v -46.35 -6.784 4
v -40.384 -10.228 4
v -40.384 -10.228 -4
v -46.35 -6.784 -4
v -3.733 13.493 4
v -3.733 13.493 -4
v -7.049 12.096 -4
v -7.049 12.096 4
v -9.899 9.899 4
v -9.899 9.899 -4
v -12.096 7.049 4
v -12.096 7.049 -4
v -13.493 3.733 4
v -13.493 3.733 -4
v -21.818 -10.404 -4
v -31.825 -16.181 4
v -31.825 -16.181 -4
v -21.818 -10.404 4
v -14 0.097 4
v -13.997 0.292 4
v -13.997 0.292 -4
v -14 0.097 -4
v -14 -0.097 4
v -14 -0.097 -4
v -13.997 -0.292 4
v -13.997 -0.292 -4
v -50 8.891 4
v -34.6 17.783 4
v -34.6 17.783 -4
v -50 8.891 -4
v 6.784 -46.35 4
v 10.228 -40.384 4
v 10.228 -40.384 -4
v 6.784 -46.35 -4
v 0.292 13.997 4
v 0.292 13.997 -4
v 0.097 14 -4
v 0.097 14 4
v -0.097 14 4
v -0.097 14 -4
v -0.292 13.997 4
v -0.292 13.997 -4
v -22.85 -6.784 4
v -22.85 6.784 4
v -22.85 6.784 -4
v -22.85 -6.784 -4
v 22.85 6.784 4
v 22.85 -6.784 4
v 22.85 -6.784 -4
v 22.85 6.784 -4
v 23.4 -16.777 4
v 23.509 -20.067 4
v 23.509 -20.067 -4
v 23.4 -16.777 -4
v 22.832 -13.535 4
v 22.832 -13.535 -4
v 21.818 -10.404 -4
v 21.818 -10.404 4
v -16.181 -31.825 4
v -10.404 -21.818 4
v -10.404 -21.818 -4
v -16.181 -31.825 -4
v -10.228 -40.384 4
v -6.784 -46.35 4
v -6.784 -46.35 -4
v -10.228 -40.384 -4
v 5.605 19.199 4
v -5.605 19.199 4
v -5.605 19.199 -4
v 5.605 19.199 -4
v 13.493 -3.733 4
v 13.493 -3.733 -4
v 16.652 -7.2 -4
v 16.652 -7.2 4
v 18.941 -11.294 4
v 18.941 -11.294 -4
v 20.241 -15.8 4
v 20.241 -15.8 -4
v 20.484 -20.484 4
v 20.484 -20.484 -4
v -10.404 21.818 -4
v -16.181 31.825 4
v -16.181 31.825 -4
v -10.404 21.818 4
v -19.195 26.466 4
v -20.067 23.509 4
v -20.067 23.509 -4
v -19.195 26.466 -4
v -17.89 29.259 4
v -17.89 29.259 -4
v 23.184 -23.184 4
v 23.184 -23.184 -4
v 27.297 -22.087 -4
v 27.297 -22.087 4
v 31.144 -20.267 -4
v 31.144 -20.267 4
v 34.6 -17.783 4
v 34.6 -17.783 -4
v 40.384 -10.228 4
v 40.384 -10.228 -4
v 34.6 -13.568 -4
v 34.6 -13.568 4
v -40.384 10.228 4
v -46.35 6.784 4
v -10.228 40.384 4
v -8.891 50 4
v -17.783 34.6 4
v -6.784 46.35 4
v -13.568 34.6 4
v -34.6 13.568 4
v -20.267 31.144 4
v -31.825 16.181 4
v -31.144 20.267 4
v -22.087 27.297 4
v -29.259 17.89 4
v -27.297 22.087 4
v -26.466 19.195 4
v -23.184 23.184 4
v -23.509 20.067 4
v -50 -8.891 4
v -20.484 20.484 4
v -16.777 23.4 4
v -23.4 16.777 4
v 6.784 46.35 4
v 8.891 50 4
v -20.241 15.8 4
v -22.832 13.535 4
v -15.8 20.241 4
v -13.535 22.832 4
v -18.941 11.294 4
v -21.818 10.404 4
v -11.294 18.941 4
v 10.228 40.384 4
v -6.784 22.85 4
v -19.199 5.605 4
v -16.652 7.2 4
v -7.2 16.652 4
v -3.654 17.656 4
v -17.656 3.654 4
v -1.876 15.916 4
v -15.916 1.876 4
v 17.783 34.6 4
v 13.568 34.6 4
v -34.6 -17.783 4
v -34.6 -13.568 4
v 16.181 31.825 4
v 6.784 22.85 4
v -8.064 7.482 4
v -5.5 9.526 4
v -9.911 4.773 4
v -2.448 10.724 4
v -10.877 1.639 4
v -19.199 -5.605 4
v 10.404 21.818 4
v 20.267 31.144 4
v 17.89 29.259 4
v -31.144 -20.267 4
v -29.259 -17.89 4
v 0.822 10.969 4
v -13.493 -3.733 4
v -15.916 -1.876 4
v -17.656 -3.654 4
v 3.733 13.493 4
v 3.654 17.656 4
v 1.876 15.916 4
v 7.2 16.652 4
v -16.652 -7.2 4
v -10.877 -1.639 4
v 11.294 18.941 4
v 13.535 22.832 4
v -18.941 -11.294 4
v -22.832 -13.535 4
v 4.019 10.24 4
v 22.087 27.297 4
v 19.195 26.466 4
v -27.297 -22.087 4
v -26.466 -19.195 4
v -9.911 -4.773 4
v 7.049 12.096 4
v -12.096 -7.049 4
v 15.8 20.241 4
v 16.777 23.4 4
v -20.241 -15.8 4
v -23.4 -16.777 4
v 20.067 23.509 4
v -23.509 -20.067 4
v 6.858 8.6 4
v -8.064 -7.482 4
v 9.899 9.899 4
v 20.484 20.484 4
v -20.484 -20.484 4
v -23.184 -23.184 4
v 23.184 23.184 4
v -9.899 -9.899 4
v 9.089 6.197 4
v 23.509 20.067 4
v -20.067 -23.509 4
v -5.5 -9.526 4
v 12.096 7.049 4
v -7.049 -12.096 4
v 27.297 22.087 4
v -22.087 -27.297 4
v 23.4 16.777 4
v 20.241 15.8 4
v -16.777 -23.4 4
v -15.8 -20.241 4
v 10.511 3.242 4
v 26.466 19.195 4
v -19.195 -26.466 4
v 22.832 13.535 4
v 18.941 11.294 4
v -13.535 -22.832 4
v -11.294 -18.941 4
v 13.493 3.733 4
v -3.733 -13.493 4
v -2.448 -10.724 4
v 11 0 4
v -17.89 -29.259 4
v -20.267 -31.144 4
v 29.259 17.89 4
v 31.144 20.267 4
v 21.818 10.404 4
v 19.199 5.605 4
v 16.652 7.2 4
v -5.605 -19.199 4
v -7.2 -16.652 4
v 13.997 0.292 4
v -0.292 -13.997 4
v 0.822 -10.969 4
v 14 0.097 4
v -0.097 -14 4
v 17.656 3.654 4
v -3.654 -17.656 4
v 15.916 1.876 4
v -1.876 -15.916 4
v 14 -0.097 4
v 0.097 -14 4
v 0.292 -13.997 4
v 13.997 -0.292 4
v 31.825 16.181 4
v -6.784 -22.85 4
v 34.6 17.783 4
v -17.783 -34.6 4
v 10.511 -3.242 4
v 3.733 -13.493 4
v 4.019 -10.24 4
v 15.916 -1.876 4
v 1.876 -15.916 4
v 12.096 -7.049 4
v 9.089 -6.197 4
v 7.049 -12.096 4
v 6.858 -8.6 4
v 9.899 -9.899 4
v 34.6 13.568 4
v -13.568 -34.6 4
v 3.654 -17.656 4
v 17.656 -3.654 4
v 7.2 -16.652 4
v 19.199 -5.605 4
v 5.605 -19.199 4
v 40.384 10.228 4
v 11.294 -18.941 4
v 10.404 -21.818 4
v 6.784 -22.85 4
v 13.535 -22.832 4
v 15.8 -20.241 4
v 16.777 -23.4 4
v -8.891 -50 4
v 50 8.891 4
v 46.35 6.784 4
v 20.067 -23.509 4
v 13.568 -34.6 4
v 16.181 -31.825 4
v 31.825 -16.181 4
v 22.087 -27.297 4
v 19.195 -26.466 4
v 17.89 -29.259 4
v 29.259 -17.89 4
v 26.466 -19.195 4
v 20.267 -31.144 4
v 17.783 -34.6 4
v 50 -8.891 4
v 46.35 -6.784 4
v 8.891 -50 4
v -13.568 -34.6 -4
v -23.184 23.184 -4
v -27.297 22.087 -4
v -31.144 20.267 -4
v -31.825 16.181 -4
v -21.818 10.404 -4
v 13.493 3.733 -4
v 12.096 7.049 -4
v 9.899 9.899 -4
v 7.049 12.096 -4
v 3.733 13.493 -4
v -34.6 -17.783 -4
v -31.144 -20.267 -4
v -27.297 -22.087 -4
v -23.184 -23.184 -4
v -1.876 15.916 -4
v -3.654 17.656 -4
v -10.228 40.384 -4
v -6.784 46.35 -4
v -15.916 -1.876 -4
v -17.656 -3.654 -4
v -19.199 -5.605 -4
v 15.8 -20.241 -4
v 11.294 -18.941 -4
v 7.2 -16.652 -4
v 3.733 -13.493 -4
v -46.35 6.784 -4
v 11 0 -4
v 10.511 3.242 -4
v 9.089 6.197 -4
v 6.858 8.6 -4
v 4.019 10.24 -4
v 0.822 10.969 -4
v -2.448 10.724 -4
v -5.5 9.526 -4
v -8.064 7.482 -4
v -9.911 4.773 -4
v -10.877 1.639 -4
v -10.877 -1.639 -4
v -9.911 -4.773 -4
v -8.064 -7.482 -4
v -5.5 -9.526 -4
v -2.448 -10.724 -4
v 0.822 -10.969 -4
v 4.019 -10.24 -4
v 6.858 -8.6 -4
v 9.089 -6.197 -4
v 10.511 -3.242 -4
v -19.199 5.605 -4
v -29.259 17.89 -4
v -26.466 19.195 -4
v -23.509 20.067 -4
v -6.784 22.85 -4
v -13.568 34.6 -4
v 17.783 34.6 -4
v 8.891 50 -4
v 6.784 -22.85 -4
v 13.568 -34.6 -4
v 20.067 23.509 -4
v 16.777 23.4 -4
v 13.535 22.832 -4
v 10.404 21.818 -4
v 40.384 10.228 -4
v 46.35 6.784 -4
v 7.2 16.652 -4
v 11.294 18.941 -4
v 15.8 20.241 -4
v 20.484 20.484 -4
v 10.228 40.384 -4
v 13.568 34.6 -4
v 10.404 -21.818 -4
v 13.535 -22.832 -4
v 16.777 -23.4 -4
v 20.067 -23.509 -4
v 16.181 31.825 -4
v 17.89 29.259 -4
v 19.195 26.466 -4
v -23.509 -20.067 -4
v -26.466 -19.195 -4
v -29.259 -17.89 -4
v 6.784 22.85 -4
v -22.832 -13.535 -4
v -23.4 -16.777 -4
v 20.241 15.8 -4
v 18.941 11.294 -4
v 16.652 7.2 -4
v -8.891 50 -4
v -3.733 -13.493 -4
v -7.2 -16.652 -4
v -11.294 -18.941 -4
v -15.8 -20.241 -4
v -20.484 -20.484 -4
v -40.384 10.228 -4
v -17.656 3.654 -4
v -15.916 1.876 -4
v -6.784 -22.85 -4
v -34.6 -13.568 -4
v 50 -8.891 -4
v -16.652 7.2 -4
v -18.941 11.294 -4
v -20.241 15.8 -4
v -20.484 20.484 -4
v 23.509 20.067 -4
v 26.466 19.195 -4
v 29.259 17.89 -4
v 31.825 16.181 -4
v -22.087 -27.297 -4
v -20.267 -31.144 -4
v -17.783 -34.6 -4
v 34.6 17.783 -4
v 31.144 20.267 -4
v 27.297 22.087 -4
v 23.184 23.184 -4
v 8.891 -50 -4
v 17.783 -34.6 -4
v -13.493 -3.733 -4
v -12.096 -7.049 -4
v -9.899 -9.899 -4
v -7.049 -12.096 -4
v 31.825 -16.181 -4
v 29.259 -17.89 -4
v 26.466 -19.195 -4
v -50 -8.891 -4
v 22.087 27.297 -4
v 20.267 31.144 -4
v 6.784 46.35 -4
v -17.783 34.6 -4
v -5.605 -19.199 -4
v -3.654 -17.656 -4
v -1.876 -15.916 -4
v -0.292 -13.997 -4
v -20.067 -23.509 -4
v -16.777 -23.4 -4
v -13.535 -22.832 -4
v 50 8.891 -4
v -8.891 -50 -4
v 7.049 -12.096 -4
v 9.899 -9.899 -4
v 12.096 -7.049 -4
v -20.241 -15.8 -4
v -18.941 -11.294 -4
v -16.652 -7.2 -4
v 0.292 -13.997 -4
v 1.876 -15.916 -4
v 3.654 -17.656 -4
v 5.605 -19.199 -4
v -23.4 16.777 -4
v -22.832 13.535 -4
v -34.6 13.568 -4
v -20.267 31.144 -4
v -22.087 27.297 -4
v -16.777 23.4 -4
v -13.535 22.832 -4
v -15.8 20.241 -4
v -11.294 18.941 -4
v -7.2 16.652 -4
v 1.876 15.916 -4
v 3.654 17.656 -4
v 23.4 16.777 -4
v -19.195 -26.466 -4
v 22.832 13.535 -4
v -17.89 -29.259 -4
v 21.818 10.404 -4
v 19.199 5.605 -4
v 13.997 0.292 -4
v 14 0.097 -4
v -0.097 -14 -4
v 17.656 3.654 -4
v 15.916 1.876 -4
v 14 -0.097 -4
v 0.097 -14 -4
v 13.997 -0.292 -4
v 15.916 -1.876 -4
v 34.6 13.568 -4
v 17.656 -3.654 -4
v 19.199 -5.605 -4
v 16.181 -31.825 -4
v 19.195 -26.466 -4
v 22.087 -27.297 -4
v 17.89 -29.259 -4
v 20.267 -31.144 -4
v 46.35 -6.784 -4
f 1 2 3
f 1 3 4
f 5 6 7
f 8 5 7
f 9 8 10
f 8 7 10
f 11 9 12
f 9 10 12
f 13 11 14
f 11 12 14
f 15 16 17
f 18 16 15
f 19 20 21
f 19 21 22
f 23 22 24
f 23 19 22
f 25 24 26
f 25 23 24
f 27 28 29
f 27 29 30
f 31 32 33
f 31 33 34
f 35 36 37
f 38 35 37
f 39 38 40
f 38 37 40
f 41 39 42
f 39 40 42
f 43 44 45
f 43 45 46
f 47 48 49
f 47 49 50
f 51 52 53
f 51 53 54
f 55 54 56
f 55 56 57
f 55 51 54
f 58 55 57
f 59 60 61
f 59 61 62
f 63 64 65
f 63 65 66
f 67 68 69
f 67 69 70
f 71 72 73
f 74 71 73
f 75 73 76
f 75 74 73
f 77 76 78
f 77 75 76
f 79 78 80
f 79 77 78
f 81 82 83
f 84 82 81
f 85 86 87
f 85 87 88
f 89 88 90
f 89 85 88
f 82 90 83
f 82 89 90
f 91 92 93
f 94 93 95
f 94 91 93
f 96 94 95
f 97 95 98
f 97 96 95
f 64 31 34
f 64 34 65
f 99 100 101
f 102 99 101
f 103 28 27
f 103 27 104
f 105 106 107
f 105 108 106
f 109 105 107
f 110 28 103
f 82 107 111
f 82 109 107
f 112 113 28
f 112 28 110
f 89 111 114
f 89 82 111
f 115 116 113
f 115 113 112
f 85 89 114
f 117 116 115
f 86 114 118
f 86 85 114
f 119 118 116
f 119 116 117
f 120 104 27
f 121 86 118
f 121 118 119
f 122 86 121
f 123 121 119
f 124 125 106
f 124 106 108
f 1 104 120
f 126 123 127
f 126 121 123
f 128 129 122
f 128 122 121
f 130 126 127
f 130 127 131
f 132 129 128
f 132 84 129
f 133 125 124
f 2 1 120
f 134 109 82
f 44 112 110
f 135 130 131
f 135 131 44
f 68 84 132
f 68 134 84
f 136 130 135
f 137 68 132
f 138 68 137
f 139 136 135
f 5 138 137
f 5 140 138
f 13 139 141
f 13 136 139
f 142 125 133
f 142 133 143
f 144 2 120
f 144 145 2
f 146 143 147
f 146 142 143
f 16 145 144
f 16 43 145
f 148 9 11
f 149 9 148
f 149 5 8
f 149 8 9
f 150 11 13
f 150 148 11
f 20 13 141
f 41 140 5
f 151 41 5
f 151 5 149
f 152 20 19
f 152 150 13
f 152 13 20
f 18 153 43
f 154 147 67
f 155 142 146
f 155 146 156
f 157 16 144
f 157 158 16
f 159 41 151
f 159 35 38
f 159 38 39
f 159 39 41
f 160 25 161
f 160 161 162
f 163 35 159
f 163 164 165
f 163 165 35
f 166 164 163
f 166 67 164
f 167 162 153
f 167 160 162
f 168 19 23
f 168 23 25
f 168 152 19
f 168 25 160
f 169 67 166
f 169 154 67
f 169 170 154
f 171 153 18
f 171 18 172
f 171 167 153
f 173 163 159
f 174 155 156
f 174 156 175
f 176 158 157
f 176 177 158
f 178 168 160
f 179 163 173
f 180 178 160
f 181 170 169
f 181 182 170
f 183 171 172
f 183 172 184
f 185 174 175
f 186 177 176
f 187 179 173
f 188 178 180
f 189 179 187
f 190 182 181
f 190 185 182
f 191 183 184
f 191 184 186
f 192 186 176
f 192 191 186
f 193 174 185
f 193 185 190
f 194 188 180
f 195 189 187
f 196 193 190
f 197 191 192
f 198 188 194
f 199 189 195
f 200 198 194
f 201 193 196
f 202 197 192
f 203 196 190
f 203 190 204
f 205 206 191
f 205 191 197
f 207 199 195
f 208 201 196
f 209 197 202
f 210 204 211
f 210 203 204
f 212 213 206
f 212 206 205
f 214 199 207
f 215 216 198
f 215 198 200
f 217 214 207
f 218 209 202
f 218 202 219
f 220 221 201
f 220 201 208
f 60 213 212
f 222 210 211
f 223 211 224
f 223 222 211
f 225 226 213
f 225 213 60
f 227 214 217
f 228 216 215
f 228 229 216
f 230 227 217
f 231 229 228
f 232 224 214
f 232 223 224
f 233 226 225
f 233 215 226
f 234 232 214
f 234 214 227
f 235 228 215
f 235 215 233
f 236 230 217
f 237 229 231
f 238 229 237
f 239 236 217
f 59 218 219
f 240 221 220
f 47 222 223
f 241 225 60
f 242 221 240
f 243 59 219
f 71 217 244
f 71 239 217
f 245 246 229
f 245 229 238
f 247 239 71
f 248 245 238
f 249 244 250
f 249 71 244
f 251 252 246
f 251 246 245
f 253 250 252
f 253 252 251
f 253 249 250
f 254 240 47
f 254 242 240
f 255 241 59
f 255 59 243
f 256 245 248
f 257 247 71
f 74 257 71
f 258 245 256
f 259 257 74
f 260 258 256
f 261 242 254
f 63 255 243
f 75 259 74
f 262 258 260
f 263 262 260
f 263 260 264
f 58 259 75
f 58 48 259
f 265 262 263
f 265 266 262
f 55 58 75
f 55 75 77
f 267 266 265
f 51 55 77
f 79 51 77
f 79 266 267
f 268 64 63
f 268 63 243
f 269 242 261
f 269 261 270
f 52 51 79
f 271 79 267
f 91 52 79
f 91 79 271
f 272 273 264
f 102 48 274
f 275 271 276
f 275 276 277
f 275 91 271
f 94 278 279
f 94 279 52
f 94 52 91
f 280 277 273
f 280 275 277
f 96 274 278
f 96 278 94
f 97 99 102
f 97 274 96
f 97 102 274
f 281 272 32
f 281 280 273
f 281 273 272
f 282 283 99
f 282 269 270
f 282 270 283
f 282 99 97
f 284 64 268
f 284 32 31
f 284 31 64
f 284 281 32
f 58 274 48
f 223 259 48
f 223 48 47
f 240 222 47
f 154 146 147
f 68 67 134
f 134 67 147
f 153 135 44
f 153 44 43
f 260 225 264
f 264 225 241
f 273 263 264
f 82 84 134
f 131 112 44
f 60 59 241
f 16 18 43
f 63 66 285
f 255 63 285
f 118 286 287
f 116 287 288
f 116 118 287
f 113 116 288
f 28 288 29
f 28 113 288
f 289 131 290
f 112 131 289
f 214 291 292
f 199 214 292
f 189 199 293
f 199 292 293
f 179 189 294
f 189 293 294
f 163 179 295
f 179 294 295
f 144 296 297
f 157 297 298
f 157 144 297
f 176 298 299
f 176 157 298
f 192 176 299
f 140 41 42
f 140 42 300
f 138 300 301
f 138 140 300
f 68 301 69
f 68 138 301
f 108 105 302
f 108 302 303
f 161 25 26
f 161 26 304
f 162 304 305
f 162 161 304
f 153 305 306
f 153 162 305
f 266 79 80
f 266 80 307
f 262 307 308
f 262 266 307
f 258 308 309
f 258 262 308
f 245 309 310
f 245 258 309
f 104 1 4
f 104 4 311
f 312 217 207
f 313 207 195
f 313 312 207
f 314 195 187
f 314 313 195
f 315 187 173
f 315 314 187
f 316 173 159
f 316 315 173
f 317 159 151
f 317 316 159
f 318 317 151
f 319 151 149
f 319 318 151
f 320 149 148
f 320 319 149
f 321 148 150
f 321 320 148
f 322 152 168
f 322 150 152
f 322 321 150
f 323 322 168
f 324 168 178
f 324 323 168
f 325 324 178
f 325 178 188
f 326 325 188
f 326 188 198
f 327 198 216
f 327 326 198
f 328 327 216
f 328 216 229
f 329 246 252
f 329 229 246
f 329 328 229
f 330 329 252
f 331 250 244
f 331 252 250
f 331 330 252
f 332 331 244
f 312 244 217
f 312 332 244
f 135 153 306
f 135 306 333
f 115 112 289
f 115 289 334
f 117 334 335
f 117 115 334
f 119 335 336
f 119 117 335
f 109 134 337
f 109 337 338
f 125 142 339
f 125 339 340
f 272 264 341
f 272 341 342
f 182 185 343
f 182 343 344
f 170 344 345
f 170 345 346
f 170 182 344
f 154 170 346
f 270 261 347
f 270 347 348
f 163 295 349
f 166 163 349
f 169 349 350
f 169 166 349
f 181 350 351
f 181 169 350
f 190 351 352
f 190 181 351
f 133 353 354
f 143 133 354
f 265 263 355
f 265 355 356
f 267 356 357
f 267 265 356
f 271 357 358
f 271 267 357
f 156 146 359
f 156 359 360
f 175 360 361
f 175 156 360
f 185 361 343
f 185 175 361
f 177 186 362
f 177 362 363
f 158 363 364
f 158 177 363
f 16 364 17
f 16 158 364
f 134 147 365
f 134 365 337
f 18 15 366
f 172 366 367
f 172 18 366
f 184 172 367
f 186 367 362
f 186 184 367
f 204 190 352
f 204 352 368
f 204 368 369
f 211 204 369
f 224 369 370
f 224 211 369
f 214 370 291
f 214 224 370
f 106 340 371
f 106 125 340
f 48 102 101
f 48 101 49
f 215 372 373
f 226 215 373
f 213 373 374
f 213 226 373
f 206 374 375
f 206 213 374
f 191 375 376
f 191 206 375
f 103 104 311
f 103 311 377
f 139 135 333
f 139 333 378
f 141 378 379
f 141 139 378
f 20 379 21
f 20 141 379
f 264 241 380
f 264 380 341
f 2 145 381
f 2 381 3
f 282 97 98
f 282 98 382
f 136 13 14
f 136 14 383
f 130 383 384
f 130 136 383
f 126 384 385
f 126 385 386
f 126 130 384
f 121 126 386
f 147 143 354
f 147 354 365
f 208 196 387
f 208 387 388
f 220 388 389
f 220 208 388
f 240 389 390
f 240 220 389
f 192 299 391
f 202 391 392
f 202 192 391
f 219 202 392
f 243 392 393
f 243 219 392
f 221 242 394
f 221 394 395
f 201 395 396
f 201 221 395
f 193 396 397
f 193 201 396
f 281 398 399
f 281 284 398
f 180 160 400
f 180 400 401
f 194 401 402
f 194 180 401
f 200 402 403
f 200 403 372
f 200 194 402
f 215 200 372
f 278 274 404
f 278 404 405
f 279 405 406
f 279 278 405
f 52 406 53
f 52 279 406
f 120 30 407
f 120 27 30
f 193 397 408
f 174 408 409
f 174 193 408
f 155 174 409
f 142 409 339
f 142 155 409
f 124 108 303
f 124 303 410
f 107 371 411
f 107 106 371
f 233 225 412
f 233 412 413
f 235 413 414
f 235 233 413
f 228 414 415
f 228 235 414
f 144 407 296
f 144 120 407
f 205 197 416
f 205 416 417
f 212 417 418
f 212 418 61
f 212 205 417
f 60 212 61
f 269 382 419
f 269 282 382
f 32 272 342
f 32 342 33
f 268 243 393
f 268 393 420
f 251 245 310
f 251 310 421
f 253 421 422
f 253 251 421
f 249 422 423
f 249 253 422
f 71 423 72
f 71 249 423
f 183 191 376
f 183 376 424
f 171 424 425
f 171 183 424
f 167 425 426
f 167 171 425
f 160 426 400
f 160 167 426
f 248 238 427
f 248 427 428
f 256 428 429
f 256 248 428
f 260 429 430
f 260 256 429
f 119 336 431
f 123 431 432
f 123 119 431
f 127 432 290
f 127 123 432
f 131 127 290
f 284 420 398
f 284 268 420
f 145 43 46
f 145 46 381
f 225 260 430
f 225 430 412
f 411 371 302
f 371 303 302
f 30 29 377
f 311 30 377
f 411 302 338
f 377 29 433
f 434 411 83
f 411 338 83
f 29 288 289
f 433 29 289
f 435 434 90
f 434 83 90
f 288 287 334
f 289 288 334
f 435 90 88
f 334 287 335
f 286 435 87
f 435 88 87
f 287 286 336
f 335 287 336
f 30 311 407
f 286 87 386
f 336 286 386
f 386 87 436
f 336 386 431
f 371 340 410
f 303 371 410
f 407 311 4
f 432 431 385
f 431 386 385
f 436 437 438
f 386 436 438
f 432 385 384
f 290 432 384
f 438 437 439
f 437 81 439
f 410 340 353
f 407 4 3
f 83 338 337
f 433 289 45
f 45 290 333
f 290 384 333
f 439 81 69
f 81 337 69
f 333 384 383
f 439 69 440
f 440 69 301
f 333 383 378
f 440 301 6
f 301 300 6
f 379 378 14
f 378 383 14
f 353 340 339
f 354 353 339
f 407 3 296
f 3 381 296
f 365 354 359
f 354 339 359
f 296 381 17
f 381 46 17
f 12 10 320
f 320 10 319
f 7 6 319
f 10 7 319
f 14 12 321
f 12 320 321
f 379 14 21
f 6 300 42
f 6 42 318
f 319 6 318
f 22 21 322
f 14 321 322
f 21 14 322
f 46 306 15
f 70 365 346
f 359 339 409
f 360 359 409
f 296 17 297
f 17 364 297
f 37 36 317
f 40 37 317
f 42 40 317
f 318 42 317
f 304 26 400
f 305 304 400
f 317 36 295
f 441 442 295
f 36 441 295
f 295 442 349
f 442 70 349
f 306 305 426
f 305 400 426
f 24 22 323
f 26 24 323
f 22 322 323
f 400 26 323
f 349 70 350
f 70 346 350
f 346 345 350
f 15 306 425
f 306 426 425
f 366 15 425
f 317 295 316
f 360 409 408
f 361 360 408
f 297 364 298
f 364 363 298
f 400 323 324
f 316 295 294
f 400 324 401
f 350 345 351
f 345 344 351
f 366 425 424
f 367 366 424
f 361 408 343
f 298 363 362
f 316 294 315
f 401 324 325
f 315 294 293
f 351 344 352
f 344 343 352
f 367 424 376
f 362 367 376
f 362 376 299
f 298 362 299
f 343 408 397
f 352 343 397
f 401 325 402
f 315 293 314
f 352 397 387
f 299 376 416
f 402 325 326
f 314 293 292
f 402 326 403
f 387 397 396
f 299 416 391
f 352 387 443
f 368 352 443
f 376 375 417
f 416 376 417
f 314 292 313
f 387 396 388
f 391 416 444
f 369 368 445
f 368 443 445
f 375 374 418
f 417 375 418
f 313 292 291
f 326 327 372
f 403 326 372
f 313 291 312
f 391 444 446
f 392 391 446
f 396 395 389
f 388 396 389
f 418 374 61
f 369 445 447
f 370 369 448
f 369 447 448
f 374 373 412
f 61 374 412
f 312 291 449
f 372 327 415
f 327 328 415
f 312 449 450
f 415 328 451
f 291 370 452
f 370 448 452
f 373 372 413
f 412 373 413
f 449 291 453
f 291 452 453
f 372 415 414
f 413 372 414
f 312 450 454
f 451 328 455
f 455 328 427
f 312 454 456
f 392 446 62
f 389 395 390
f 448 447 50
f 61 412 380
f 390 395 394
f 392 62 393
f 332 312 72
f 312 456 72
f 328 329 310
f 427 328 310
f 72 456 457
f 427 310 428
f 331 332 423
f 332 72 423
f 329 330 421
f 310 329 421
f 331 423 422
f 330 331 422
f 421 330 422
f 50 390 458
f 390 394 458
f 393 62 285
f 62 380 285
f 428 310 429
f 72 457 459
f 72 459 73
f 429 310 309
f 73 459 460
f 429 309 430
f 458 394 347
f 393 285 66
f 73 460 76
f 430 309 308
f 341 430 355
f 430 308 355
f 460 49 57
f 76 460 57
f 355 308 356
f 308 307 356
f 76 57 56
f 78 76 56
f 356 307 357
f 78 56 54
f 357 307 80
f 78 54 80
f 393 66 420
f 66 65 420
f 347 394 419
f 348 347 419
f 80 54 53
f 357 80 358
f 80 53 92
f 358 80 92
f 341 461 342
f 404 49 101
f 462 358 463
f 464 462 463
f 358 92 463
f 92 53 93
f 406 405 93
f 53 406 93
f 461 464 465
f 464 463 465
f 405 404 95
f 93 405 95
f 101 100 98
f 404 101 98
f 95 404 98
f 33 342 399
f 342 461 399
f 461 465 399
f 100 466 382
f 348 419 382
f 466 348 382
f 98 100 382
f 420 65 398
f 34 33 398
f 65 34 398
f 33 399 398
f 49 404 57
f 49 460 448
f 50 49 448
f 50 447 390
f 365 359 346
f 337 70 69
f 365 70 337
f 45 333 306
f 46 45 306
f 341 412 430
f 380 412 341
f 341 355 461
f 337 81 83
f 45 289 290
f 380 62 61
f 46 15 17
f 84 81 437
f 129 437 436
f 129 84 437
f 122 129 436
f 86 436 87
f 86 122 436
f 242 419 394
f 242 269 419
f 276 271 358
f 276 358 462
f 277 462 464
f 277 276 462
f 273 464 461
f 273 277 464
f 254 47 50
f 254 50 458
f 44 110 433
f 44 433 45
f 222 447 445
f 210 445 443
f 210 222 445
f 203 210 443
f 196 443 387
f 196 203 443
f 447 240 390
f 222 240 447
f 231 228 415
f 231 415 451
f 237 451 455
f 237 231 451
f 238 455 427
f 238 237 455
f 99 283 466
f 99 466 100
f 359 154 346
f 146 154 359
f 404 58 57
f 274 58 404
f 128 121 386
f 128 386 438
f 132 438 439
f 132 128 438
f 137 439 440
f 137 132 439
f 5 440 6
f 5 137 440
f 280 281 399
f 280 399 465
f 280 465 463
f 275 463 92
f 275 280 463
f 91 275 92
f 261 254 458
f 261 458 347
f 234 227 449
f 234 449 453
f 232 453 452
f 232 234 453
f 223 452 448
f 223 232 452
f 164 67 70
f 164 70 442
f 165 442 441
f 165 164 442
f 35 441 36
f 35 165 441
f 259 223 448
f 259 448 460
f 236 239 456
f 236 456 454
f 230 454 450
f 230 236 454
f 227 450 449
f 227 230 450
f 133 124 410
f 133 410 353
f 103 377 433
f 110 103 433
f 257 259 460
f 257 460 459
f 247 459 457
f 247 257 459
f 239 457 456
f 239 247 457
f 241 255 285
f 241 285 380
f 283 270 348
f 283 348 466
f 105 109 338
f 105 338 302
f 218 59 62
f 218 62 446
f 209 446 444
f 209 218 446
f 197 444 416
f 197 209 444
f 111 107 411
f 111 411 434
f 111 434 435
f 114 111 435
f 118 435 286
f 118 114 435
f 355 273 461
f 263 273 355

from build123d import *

# Parameters (mm, degrees)
F0_R     = 11
F1_DEPTH = 4
F2_COUNT = 4


with BuildPart() as f1:
    # F0 (on Top) → F1 (new body, symmetric)
    with BuildSketch(Plane.XY):
        with BuildLine():
            ThreePointArc((-17.7828708233, 34.5995821148), (-23.3825877712, 16.6188629138), (-13.9969587461, 0.291797633))
            ThreePointArc((-13.9969587461, 0.291797633), (0, -14), (13.9969587461, 0.291797633))
            ThreePointArc((13.9969587461, 0.291797633), (23.3825877712, 16.6188629138), (17.7828708233, 34.5995821148))
            Line((17.7828708233, 34.5995821148), (8.8914354117, 50))
            Line((8.8914354117, 50), (-8.8914354117, 50))
            Line((-8.8914354117, 50), (-17.7828708233, 34.5995821148))
        make_face()
        Circle(F0_R, mode=Mode.SUBTRACT)
        with BuildLine():
            Line((8.8914354117, 19.1991642296), (16.1812389964, 31.8254744156))
            ThreePointArc((16.1812389964, 31.8254744156), (20.4311974682, 17.2440748743), (13.4930582959, 3.7332797675))
            ThreePointArc((13.4930582959, 3.7332797675), (0, 14), (-13.4930582959, 3.7332797675))
            ThreePointArc((-13.4930582959, 3.7332797675), (-20.4311974682, 17.2440748743), (-16.1812389964, 31.8254744156))
            Line((-16.1812389964, 31.8254744156), (-8.8914354117, 19.1991642296))
            Line((-8.8914354117, 19.1991642296), (8.8914354117, 19.1991642296))
        make_face(mode=Mode.SUBTRACT)
        Polygon((10.2282444271, 40.3837430948), (13.567731326, 34.5995821148), (6.783865663, 22.8495821148), (-6.783865663, 22.8495821148), (-13.567731326, 34.5995821148), (-10.2282444271, 40.3837430948), (-6.783865663, 46.3495821148), (6.783865663, 46.3495821148), align=None, mode=Mode.SUBTRACT)
    extrude(amount=F1_DEPTH, both=True)

    # F2: F1 ×4 about axis
    f2_axis = Axis((0, 0, 4), (0, 0, 1))


with BuildPart() as f1_1:
    add(f1.part)
    for i in range(1, F2_COUNT):
        add(f1.part.rotate(f2_axis, i * 360 / F2_COUNT))


solid = f1_1.part
